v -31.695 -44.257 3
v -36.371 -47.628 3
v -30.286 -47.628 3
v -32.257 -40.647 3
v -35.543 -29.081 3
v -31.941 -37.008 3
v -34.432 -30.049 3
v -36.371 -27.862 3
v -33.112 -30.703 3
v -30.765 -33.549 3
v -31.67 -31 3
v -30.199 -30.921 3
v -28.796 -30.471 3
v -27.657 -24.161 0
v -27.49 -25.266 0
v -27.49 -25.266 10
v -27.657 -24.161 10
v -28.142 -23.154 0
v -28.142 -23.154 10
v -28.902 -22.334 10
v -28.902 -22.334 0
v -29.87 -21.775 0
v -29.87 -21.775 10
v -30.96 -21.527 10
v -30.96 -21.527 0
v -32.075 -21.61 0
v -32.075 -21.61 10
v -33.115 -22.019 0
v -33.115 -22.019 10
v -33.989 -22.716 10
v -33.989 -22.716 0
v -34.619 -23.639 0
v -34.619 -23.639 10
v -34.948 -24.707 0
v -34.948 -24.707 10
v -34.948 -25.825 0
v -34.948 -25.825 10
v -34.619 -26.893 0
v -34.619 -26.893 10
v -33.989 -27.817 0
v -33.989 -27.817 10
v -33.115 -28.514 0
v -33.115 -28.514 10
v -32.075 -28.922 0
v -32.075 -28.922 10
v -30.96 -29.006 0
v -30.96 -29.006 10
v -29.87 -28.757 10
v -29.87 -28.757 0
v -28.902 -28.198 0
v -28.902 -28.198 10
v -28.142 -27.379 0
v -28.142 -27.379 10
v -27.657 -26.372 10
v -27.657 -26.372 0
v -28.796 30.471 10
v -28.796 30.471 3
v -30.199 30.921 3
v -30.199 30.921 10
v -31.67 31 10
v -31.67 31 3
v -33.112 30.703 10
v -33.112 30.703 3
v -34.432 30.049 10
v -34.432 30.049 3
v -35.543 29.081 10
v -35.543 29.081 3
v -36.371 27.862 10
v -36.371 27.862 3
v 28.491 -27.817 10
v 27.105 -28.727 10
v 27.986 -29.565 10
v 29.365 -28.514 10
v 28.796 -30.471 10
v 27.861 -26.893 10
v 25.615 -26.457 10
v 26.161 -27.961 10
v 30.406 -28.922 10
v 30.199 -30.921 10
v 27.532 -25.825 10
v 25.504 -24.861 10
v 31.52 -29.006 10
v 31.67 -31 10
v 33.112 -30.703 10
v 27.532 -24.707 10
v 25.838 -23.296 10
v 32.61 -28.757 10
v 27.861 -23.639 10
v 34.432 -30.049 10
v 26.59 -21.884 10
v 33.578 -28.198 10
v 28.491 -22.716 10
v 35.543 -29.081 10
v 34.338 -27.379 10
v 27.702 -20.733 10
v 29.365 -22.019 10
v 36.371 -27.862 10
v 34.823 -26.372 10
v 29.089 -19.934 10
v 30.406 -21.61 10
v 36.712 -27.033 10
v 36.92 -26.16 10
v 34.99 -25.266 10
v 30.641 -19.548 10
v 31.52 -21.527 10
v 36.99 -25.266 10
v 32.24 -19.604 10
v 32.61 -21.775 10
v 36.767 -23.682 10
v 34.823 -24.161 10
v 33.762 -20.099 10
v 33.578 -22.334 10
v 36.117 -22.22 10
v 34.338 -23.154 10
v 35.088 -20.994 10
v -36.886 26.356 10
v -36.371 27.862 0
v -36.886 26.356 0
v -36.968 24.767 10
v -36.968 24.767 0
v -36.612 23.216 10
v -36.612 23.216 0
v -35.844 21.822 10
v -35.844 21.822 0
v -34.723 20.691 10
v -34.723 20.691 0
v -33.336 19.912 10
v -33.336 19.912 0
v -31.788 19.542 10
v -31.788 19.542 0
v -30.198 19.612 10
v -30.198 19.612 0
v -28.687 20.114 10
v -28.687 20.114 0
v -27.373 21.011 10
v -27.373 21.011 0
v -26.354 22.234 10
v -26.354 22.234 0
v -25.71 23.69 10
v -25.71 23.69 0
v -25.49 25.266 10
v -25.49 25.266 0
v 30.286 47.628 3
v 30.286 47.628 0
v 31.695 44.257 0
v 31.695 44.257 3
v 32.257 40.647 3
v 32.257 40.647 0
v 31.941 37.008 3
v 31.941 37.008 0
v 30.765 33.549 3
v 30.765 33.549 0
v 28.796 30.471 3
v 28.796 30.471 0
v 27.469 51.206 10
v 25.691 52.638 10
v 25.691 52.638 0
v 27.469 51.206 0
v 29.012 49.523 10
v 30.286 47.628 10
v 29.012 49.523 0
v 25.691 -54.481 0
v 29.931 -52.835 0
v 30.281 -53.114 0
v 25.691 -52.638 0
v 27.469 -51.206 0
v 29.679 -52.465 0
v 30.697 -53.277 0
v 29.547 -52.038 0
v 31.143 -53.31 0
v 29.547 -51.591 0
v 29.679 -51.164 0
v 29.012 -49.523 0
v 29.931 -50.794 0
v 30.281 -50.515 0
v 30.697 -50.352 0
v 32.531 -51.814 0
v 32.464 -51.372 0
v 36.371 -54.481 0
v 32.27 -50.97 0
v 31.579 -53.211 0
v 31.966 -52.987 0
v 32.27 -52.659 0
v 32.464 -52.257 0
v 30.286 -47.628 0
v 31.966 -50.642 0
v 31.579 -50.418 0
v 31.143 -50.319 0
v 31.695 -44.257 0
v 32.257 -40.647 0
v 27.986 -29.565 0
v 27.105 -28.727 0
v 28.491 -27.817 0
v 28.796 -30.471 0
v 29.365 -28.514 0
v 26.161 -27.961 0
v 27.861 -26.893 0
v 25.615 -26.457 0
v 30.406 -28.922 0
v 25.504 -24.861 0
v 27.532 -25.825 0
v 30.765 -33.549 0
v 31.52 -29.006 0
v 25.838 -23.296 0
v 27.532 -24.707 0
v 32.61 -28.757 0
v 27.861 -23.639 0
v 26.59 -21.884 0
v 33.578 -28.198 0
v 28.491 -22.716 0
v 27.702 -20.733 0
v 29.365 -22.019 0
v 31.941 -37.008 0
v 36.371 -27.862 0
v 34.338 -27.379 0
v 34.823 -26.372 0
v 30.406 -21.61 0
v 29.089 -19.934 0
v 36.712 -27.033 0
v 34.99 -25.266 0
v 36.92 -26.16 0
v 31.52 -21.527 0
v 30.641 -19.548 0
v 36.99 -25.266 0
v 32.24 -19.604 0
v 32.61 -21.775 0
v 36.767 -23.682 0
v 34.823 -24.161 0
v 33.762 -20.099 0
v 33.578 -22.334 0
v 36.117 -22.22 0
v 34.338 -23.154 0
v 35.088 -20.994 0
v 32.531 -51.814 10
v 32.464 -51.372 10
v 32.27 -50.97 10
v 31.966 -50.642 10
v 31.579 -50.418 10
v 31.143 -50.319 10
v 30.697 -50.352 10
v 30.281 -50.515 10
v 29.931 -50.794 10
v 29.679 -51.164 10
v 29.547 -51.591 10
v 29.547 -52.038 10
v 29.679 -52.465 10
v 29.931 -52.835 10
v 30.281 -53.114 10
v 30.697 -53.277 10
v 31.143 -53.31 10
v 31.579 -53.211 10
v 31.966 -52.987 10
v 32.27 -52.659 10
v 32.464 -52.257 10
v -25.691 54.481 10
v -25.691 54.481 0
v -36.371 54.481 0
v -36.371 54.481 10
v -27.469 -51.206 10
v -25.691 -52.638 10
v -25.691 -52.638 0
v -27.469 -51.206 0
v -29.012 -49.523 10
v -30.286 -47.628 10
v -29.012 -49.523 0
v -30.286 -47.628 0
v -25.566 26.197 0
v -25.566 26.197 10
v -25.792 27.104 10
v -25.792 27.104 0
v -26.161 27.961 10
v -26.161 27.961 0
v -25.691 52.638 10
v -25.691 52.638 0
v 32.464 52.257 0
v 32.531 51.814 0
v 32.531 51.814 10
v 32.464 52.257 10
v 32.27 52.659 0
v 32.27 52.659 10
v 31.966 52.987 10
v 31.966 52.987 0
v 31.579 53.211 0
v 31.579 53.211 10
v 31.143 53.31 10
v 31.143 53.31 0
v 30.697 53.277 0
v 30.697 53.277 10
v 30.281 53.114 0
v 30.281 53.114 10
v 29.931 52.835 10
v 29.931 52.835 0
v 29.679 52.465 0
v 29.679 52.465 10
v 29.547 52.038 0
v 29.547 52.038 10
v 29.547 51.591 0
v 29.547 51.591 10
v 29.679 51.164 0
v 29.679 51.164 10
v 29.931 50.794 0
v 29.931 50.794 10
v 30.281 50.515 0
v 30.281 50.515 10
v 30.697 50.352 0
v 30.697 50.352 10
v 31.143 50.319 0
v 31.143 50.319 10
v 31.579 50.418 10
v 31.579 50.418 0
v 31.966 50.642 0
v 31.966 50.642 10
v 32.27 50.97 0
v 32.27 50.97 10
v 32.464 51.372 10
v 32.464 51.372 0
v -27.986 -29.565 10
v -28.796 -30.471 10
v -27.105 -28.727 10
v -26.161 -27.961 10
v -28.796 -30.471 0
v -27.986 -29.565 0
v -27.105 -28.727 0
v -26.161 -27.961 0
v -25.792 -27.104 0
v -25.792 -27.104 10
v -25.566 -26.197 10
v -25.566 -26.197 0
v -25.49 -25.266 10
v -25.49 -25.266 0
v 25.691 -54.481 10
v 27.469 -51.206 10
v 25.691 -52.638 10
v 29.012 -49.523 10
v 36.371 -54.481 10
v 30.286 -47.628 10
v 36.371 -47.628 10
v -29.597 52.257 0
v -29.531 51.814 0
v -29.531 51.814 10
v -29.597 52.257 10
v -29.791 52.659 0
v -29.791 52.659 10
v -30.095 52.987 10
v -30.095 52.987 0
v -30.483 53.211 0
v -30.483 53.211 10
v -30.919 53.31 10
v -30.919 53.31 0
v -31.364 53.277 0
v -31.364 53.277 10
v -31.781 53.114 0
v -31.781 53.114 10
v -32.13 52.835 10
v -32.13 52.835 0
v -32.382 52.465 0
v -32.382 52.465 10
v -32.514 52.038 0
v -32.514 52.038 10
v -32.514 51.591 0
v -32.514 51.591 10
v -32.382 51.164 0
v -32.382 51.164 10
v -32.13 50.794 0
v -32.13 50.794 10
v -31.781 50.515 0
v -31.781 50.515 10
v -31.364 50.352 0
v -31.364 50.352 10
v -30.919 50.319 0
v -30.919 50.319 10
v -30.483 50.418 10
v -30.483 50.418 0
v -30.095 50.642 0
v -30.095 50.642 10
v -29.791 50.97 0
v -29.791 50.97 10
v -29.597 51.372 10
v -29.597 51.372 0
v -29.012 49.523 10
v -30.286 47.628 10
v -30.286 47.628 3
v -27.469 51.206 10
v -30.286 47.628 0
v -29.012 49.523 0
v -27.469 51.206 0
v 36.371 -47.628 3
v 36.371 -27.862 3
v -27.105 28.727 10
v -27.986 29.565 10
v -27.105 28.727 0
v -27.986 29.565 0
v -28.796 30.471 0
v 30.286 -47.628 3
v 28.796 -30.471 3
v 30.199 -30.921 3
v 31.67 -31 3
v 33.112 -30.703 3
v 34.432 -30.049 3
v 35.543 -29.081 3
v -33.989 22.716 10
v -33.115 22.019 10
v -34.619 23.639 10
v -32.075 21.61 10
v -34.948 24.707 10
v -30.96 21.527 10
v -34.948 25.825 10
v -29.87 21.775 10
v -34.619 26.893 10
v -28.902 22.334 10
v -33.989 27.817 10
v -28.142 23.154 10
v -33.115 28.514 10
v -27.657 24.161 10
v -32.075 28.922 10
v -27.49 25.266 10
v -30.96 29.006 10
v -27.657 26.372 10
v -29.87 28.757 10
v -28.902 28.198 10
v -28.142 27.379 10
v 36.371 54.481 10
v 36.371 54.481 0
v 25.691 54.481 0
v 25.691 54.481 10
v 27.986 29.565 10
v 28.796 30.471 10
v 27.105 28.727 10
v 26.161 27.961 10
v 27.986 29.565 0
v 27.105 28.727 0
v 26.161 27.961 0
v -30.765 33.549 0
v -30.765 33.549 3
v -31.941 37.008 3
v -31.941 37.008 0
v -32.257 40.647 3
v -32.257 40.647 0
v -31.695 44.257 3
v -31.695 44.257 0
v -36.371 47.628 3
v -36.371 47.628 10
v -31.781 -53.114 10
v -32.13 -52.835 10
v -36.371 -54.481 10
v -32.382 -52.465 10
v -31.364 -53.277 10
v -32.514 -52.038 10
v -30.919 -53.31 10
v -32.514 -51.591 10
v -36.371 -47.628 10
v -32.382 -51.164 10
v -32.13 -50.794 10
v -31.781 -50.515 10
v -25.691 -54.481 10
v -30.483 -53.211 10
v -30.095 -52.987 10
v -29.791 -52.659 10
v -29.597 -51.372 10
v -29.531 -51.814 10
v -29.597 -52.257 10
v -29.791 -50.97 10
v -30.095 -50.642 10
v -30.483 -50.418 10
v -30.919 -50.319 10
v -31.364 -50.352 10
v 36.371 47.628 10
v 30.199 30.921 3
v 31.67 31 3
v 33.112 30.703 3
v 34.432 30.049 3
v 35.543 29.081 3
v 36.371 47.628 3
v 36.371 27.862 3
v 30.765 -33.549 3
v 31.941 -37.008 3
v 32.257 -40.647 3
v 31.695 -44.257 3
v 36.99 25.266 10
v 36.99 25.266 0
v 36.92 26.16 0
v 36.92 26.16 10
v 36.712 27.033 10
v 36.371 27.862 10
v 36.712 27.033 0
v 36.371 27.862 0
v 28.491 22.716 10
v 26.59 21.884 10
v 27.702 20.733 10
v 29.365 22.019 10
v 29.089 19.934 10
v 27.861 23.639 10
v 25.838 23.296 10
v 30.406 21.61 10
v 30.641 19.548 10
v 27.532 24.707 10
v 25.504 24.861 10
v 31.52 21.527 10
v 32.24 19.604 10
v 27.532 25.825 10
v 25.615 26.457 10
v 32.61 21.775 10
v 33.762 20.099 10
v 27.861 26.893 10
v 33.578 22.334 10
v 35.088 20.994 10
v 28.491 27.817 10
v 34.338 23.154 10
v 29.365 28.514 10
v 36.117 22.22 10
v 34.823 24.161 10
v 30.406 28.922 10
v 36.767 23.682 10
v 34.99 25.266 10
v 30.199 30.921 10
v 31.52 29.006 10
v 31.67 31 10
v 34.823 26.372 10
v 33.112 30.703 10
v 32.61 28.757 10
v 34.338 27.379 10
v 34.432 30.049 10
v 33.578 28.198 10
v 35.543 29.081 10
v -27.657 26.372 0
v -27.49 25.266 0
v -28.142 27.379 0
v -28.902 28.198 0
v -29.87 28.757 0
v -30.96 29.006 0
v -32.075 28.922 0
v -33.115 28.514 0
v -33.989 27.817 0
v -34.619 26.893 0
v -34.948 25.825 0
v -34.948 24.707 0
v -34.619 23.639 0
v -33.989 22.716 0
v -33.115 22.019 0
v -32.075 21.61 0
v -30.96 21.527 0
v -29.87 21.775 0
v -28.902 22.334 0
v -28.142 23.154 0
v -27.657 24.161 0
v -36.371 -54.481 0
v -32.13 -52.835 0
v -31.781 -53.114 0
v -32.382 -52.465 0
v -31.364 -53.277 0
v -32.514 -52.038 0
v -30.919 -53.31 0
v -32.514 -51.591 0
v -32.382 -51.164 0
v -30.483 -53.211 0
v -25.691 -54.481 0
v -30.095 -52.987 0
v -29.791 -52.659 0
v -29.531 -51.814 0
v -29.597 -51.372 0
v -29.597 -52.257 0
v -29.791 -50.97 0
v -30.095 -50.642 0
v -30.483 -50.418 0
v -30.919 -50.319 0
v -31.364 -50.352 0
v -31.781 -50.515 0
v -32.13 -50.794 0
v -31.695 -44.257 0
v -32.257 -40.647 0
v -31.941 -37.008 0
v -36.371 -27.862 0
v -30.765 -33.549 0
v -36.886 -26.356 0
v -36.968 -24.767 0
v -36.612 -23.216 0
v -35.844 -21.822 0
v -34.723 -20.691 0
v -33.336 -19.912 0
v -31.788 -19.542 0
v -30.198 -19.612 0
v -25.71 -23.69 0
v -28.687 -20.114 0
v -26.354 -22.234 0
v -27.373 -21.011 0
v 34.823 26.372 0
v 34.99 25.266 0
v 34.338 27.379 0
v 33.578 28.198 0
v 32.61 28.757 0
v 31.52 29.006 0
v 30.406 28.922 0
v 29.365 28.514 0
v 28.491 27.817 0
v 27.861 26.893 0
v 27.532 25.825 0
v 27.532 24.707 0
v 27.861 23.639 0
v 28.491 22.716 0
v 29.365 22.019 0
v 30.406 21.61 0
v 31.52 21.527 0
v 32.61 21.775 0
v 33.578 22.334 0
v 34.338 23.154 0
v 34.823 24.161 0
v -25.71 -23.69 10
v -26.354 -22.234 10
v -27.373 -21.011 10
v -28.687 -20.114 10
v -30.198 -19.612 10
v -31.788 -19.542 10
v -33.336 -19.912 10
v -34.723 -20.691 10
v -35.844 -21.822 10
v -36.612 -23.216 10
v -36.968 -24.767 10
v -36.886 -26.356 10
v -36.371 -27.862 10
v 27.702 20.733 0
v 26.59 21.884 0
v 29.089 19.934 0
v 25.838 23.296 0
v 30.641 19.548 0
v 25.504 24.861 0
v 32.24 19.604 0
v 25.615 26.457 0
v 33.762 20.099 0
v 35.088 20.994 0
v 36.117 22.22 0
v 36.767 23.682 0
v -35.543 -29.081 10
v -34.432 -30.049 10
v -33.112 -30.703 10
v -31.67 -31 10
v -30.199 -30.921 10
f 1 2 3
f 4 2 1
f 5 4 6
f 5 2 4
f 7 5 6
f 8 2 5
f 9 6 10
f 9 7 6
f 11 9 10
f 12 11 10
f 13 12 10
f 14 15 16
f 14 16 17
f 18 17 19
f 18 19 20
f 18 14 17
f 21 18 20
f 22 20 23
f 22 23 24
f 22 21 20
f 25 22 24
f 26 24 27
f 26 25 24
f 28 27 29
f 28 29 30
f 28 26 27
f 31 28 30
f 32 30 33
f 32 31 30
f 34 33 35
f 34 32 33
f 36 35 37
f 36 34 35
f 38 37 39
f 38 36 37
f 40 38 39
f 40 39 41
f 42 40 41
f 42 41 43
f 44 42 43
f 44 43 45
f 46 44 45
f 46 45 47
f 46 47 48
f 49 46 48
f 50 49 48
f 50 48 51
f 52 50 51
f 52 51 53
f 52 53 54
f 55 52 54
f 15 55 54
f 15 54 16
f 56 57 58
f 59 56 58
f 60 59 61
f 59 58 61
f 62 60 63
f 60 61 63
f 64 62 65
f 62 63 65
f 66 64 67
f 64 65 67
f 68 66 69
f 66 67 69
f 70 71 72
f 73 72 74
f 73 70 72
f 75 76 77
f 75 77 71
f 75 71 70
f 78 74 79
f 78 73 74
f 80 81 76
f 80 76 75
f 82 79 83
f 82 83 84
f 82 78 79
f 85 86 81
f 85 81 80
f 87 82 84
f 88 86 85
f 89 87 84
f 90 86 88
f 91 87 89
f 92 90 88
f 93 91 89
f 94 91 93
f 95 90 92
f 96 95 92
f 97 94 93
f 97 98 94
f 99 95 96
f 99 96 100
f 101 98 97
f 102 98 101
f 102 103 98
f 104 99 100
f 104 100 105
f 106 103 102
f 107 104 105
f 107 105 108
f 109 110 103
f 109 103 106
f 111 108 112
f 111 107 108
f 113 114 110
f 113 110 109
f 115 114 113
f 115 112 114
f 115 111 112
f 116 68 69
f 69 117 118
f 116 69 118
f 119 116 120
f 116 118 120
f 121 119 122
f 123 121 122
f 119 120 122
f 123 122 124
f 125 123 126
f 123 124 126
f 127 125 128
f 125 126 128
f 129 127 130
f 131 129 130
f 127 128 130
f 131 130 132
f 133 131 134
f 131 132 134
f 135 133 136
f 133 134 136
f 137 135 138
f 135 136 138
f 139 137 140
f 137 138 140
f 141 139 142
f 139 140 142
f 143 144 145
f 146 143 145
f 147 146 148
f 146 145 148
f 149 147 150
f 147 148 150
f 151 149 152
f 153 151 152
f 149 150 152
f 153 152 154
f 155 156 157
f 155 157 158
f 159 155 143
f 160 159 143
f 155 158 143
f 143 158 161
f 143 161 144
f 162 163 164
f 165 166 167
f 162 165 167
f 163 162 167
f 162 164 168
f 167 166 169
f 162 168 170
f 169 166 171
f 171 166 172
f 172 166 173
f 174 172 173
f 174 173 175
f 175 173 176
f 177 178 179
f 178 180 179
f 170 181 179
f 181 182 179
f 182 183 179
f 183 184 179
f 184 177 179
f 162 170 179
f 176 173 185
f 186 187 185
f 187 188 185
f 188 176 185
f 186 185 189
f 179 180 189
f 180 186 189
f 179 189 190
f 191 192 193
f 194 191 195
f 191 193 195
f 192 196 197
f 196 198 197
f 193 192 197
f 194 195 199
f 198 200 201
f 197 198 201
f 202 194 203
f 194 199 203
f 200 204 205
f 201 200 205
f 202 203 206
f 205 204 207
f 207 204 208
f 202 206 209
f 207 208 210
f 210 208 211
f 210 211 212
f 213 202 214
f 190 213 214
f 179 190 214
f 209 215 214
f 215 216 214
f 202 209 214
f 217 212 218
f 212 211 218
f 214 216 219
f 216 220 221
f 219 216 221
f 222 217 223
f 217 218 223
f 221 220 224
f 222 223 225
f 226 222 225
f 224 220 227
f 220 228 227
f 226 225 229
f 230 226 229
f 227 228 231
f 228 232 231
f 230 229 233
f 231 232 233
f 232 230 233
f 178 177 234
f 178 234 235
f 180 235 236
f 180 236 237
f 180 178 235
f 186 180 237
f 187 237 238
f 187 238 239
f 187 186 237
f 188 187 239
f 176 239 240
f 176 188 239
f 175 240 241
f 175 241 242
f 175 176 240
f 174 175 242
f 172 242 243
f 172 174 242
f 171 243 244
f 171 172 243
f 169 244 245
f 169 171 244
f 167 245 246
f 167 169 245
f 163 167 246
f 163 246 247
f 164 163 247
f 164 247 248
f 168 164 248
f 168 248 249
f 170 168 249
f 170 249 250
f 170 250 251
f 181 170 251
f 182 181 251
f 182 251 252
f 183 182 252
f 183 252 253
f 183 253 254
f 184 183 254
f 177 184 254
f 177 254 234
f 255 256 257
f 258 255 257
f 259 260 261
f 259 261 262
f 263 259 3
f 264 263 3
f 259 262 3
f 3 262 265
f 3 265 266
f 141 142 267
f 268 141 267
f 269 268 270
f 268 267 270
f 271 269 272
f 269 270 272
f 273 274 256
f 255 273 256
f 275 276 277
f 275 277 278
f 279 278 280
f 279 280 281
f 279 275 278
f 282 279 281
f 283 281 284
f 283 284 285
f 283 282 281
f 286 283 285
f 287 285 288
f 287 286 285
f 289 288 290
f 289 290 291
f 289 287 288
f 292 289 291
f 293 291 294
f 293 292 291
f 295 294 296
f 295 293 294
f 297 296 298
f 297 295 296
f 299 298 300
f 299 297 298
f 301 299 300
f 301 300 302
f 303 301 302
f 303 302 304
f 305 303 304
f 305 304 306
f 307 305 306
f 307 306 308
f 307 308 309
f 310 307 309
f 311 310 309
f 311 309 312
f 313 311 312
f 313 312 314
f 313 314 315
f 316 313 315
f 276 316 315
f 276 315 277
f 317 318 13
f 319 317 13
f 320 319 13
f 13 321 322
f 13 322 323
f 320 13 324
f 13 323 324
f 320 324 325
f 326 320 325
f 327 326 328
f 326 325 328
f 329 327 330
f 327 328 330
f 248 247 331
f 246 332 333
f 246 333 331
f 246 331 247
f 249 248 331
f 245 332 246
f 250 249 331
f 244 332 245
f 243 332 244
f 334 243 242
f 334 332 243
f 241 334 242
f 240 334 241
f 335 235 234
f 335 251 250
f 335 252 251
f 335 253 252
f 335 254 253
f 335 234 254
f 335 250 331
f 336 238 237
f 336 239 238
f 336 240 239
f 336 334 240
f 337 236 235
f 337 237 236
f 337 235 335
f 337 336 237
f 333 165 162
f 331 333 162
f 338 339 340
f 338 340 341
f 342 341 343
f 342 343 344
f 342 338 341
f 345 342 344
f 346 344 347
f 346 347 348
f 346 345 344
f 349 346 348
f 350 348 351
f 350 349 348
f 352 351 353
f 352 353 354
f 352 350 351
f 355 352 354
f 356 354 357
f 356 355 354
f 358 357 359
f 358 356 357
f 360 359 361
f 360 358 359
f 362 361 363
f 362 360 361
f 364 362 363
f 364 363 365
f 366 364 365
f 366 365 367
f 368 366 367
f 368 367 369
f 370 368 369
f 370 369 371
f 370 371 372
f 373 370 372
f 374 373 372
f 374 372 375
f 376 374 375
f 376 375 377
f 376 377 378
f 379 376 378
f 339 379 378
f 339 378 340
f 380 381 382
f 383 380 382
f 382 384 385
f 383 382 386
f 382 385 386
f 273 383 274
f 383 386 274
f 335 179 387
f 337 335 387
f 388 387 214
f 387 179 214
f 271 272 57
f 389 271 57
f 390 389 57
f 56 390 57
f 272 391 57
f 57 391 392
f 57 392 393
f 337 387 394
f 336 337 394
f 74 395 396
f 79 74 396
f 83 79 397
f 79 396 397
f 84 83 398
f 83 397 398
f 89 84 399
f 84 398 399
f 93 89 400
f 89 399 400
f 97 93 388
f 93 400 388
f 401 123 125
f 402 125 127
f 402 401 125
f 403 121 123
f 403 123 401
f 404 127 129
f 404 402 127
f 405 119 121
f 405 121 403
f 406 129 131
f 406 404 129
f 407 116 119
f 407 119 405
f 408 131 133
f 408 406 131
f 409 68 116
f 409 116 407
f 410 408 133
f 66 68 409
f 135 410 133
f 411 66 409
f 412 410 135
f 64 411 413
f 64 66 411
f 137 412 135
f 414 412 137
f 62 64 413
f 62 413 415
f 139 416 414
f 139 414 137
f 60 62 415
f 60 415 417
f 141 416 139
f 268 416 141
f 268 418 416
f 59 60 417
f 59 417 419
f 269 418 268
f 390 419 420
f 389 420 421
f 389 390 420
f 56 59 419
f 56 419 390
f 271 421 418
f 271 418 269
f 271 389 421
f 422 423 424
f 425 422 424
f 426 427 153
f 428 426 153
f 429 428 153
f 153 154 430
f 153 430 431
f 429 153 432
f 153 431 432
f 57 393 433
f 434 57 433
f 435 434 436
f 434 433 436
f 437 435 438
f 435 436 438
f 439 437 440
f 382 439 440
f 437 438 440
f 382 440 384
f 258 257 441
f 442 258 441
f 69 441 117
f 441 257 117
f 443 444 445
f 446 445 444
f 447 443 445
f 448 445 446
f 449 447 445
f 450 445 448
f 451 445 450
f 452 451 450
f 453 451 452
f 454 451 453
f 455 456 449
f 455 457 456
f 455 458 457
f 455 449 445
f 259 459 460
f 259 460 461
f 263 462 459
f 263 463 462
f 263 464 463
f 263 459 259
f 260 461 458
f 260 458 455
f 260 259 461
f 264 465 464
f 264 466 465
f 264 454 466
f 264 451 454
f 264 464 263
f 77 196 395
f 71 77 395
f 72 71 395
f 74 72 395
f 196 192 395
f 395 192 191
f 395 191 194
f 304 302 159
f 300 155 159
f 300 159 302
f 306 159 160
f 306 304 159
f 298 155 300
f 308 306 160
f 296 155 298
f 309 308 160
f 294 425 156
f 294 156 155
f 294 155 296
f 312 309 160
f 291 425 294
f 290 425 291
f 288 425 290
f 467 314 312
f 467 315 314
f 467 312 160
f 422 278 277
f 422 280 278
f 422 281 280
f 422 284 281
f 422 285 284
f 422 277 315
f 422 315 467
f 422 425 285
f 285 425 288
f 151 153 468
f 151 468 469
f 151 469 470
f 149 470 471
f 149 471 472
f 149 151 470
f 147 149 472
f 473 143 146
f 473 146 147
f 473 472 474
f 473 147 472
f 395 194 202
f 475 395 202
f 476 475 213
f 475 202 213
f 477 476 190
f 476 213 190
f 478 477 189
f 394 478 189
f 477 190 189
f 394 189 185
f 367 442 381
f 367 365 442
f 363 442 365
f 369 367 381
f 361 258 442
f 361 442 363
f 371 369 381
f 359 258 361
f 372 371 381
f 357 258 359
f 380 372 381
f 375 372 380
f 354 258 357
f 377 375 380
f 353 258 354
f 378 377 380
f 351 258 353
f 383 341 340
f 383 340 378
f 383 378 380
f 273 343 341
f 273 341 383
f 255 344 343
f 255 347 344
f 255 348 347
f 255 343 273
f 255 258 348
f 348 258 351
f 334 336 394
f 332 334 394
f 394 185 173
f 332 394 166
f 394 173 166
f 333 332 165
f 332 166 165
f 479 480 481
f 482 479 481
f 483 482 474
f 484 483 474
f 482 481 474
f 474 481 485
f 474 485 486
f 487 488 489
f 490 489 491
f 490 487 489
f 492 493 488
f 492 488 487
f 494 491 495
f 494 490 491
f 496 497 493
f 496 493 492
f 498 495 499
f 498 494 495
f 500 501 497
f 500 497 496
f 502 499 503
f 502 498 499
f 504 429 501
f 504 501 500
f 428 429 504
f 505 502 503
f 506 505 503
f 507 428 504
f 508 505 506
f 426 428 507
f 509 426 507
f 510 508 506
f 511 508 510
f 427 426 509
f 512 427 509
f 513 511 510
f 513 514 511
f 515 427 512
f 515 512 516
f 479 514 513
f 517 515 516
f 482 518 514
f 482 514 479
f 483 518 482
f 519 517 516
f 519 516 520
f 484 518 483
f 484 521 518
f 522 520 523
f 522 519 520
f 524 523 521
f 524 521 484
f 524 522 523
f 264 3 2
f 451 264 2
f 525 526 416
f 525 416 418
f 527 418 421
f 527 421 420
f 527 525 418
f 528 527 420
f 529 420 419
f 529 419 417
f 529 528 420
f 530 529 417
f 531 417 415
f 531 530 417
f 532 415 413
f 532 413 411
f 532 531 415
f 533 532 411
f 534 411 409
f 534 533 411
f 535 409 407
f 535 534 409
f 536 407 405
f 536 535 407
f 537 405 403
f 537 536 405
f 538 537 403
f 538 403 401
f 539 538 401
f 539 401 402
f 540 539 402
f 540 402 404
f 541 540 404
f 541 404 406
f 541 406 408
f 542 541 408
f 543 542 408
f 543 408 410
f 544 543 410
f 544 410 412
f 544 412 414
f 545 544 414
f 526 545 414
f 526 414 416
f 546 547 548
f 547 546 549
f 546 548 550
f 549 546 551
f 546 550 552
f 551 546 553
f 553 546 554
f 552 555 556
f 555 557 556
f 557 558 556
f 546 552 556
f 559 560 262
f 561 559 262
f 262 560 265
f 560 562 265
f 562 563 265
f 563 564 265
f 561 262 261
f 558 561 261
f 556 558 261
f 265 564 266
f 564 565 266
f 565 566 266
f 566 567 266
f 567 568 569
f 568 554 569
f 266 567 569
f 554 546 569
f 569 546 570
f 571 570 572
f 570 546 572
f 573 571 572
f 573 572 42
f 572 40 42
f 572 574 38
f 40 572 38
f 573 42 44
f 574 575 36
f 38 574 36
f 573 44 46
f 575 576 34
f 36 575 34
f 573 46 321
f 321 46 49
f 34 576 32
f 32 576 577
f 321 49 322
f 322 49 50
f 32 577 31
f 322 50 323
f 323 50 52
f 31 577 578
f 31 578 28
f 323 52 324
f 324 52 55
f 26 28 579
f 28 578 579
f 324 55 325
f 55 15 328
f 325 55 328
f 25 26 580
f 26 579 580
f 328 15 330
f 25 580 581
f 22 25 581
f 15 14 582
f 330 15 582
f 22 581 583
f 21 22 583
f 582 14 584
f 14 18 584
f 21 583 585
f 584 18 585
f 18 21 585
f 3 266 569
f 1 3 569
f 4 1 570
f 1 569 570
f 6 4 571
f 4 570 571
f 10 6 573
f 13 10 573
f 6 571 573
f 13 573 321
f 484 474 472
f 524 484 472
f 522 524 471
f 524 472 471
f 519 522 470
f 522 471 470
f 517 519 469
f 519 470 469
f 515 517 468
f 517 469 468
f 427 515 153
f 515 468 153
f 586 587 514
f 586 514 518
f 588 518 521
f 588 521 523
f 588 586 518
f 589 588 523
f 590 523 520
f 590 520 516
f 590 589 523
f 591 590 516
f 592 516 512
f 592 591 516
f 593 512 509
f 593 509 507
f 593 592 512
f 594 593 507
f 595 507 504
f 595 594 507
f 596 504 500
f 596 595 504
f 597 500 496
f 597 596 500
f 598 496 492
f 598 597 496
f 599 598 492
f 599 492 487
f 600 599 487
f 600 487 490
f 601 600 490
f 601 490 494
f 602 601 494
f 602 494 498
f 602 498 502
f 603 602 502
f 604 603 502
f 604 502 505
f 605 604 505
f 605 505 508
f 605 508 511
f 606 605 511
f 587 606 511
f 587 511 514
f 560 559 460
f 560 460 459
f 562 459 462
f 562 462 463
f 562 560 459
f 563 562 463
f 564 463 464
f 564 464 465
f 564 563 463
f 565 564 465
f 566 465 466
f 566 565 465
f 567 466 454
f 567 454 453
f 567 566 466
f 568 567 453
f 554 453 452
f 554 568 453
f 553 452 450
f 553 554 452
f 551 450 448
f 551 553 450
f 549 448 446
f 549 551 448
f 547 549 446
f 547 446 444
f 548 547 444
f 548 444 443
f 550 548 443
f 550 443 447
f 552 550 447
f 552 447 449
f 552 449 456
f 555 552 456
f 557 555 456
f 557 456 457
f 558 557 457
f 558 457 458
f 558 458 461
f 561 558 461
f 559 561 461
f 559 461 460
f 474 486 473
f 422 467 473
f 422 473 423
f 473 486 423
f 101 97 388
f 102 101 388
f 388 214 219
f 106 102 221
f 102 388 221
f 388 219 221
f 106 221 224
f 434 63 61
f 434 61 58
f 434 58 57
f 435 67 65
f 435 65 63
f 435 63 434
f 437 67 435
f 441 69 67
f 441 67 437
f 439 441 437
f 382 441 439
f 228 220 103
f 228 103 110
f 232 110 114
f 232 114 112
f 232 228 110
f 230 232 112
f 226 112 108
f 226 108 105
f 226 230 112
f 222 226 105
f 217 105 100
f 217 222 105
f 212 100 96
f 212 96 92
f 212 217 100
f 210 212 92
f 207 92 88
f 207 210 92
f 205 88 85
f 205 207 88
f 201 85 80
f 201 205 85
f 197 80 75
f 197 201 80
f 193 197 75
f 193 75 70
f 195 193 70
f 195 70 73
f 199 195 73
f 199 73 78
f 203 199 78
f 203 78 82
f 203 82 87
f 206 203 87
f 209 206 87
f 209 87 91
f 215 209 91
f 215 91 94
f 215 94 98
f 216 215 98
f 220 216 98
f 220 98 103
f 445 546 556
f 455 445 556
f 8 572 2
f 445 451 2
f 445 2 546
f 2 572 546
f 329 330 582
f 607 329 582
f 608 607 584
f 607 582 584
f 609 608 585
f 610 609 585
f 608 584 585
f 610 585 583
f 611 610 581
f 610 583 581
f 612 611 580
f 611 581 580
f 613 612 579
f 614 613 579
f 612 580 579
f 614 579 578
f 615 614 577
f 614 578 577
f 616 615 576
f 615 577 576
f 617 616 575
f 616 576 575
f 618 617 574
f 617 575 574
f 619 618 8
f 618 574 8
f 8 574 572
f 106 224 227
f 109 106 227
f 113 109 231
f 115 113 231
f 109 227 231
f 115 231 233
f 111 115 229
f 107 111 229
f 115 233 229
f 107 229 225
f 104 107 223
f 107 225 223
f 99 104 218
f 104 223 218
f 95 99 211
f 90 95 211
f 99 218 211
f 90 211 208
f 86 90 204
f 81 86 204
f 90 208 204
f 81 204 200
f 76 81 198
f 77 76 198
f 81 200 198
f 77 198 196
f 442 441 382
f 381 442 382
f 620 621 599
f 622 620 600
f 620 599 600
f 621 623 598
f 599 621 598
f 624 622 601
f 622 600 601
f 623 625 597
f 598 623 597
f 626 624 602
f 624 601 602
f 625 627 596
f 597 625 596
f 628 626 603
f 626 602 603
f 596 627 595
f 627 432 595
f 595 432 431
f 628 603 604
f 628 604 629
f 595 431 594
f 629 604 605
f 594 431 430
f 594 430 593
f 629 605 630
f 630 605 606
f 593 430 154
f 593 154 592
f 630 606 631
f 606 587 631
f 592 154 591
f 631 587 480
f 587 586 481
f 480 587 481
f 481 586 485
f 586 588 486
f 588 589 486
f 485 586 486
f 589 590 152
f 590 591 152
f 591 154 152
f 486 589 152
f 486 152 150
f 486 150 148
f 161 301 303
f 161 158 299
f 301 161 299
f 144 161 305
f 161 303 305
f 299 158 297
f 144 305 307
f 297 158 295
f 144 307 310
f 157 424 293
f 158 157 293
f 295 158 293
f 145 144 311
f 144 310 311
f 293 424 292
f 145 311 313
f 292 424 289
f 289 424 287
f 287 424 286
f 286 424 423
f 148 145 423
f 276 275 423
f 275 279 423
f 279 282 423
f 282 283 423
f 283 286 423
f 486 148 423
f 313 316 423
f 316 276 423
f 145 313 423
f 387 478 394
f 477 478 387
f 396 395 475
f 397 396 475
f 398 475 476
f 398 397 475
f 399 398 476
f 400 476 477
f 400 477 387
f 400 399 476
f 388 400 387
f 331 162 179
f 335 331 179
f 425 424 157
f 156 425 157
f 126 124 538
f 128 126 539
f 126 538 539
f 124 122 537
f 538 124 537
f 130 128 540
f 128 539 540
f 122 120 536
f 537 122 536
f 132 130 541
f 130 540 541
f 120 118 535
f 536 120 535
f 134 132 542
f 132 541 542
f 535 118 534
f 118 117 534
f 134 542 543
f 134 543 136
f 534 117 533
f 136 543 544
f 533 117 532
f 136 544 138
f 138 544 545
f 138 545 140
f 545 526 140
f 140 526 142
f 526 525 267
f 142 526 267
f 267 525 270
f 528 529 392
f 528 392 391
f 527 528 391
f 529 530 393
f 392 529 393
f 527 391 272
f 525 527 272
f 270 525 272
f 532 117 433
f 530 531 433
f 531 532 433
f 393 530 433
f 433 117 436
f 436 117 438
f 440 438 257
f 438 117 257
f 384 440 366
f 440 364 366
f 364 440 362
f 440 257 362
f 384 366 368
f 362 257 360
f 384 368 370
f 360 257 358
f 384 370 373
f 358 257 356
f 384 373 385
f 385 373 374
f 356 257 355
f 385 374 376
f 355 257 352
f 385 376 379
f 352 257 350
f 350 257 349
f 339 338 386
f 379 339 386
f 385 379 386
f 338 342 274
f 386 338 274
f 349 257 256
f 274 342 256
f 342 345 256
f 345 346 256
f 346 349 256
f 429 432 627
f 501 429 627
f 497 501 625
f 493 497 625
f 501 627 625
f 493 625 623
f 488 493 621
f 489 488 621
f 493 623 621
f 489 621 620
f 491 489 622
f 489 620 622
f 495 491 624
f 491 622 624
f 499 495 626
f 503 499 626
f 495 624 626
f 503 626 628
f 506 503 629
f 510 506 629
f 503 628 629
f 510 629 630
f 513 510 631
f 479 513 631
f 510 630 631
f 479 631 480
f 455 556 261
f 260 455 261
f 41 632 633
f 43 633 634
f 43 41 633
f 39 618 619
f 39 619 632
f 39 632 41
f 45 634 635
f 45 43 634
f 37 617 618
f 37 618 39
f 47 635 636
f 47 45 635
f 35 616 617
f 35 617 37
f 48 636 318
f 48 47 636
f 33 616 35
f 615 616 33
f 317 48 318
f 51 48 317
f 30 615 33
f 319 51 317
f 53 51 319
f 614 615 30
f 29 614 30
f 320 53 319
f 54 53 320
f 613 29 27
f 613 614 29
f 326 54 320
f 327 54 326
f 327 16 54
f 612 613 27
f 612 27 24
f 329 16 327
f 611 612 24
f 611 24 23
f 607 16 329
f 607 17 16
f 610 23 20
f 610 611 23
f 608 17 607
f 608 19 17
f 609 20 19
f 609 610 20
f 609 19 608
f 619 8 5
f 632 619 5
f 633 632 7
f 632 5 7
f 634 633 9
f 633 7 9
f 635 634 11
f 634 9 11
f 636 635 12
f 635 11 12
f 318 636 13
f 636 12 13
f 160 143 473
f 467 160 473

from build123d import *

# Parameters (mm, degrees)
F0_R     = 3.75
F0_R_2   = 1.5
F1_DEPTH = 3
F2_DEPTH = 10


with BuildPart() as f1:
    # F0 (on Top) → F1 (new body)
    with BuildSketch(Plane.XY):
        with BuildLine():
            ThreePointArc((-36.370623, 27.862394), (-32.574581, 19.67326), (-25.490072, 25.266254))
            ThreePointArc((-25.490072, 25.266254), (-25.660285, 26.65495), (-26.160846, 27.961428))
            ThreePointArc((-26.160846, 27.961428), (-27.553867, 29.136956), (-28.795974, 30.470953))
            ThreePointArc((-28.795974, 30.470953), (-33.112344, 30.702898), (-36.370623, 27.862394))
        make_face()
        with Locations((-31.240072, 25.266254)):
            Circle(F0_R, mode=Mode.SUBTRACT)
        with BuildLine():
            ThreePointArc((26.160846, 27.961428), (29.851376, 19.686467), (36.990072, 25.266254))
            ThreePointArc((36.990072, 25.266254), (36.833066, 26.600763), (36.370623, 27.862394))
            ThreePointArc((36.370623, 27.862394), (33.112344, 30.702898), (28.795974, 30.470953))
            ThreePointArc((28.795974, 30.470953), (27.553867, 29.136956), (26.160846, 27.961428))
        make_face()
        with Locations((31.240072, 25.266254)):
            Circle(F0_R, mode=Mode.SUBTRACT)
        with BuildLine():
            Line((30.285853, 47.628131), (36.370623, 47.628131))
            Line((36.370623, 47.628131), (36.370623, 54.481386))
            Line((36.370623, 54.481386), (25.690743, 54.481386))
            Line((25.690743, 54.481386), (25.690743, 52.638071))
            ThreePointArc((25.690743, 52.638071), (28.272313, 50.393599), (30.285853, 47.628131))
        make_face()
        with Locations((31.030683, 51.814485)):
            Circle(F0_R_2, mode=Mode.SUBTRACT)
        with BuildLine():
            ThreePointArc((36.370623, -27.862394), (36.833066, -26.600763), (36.990072, -25.266254))
            ThreePointArc((36.990072, -25.266254), (29.851376, -19.686467), (26.160846, -27.961428))
            ThreePointArc((26.160846, -27.961428), (27.553867, -29.136956), (28.795974, -30.470953))
            ThreePointArc((28.795974, -30.470953), (33.112344, -30.702898), (36.370623, -27.862394))
        make_face()
        with Locations((31.240072, -25.266254)):
            Circle(F0_R, mode=Mode.SUBTRACT)
        with BuildLine():
            Line((36.370623, -47.628131), (36.370623, -27.862394))
            ThreePointArc((36.370623, -27.862394), (33.112344, -30.702898), (28.795974, -30.470953))
            ThreePointArc((28.795974, -30.470953), (32.208965, -38.817856), (30.285853, -47.628131))
            Line((30.285853, -47.628131), (36.370623, -47.628131))
        make_face()
        with BuildLine():
            ThreePointArc((-26.160846, -27.961428), (-25.660285, -26.65495), (-25.490072, -25.266254))
            ThreePointArc((-25.490072, -25.266254), (-32.574581, -19.67326), (-36.370623, -27.862394))
            ThreePointArc((-36.370623, -27.862394), (-33.112344, -30.702898), (-28.795974, -30.470953))
            ThreePointArc((-28.795974, -30.470953), (-27.553867, -29.136956), (-26.160846, -27.961428))
        make_face()
        with Locations((-31.240072, -25.266254)):
            Circle(F0_R, mode=Mode.SUBTRACT)
        with BuildLine():
            Line((-36.370623, 47.628131), (-36.370623, 27.862394))
            ThreePointArc((-36.370623, 27.862394), (-33.112344, 30.702898), (-28.795974, 30.470953))
            ThreePointArc((-28.795974, 30.470953), (-32.208965, 38.817856), (-30.285853, 47.628131))
            Line((-30.285853, 47.628131), (-36.370623, 47.628131))
        make_face()
        with BuildLine():
            ThreePointArc((-28.795974, -30.470953), (-33.112344, -30.702898), (-36.370623, -27.862394))
            Line((-36.370623, -27.862394), (-36.370623, -47.628131))
            Line((-36.370623, -47.628131), (-30.285853, -47.628131))
            ThreePointArc((-30.285853, -47.628131), (-32.208965, -38.817856), (-28.795974, -30.470953))
        make_face()
        with BuildLine():
            ThreePointArc((28.795974, 30.470953), (33.112344, 30.702898), (36.370623, 27.862394))
            Line((36.370623, 27.862394), (36.370623, 47.628131))
            Line((36.370623, 47.628131), (30.285853, 47.628131))
            ThreePointArc((30.285853, 47.628131), (32.208965, 38.817856), (28.795974, 30.470953))
        make_face()
        with BuildLine():
            Line((-36.370623, 54.481386), (-36.370623, 47.628131))
            Line((-36.370623, 47.628131), (-30.285853, 47.628131))
            ThreePointArc((-30.285853, 47.628131), (-28.272313, 50.393599), (-25.690743, 52.638071))
            Line((-25.690743, 52.638071), (-25.690743, 54.481386))
            Line((-25.690743, 54.481386), (-36.370623, 54.481386))
        make_face()
        with Locations((-31.030683, 51.814485)):
            Circle(F0_R_2, mode=Mode.SUBTRACT)
        with BuildLine():
            Line((36.370623, -54.481386), (36.370623, -47.628131))
            Line((36.370623, -47.628131), (30.285853, -47.628131))
            ThreePointArc((30.285853, -47.628131), (28.272313, -50.393599), (25.690743, -52.638071))
            Line((25.690743, -52.638071), (25.690743, -54.481386))
            Line((25.690743, -54.481386), (36.370623, -54.481386))
        make_face()
        with Locations((31.030683, -51.814485)):
            Circle(F0_R_2, mode=Mode.SUBTRACT)
        with BuildLine():
            Line((-30.285853, -47.628131), (-36.370623, -47.628131))
            Line((-36.370623, -47.628131), (-36.370623, -54.481386))
            Line((-36.370623, -54.481386), (-25.690743, -54.481386))
            Line((-25.690743, -54.481386), (-25.690743, -52.638071))
            ThreePointArc((-25.690743, -52.638071), (-28.272313, -50.393599), (-30.285853, -47.628131))
        make_face()
        with Locations((-31.030683, -51.814485)):
            Circle(F0_R_2, mode=Mode.SUBTRACT)
    extrude(amount=F1_DEPTH)

    # F0 (on Top) → F2 (join)
    with BuildSketch(Plane.XY):
        with BuildLine():
            ThreePointArc((-36.370623, 27.862394), (-32.574581, 19.67326), (-25.490072, 25.266254))
            ThreePointArc((-25.490072, 25.266254), (-25.660285, 26.65495), (-26.160846, 27.961428))
            ThreePointArc((-26.160846, 27.961428), (-27.553867, 29.136956), (-28.795974, 30.470953))
            ThreePointArc((-28.795974, 30.470953), (-33.112344, 30.702898), (-36.370623, 27.862394))
        make_face()
        with Locations((-31.240072, 25.266254)):
            Circle(F0_R, mode=Mode.SUBTRACT)
        with BuildLine():
            ThreePointArc((26.160846, 27.961428), (29.851376, 19.686467), (36.990072, 25.266254))
            ThreePointArc((36.990072, 25.266254), (36.833066, 26.600763), (36.370623, 27.862394))
            ThreePointArc((36.370623, 27.862394), (33.112344, 30.702898), (28.795974, 30.470953))
            ThreePointArc((28.795974, 30.470953), (27.553867, 29.136956), (26.160846, 27.961428))
        make_face()
        with Locations((31.240072, 25.266254)):
            Circle(F0_R, mode=Mode.SUBTRACT)
        with BuildLine():
            ThreePointArc((36.370623, -27.862394), (36.833066, -26.600763), (36.990072, -25.266254))
            ThreePointArc((36.990072, -25.266254), (29.851376, -19.686467), (26.160846, -27.961428))
            ThreePointArc((26.160846, -27.961428), (27.553867, -29.136956), (28.795974, -30.470953))
            ThreePointArc((28.795974, -30.470953), (33.112344, -30.702898), (36.370623, -27.862394))
        make_face()
        with Locations((31.240072, -25.266254)):
            Circle(F0_R, mode=Mode.SUBTRACT)
        with BuildLine():
            ThreePointArc((-26.160846, -27.961428), (-25.660285, -26.65495), (-25.490072, -25.266254))
            ThreePointArc((-25.490072, -25.266254), (-32.574581, -19.67326), (-36.370623, -27.862394))
            ThreePointArc((-36.370623, -27.862394), (-33.112344, -30.702898), (-28.795974, -30.470953))
            ThreePointArc((-28.795974, -30.470953), (-27.553867, -29.136956), (-26.160846, -27.961428))
        make_face()
        with Locations((-31.240072, -25.266254)):
            Circle(F0_R, mode=Mode.SUBTRACT)
        with BuildLine():
            Line((-36.370623, 54.481386), (-36.370623, 47.628131))
            Line((-36.370623, 47.628131), (-30.285853, 47.628131))
            ThreePointArc((-30.285853, 47.628131), (-28.272313, 50.393599), (-25.690743, 52.638071))
            Line((-25.690743, 52.638071), (-25.690743, 54.481386))
            Line((-25.690743, 54.481386), (-36.370623, 54.481386))
        make_face()
        with Locations((-31.030683, 51.814485)):
            Circle(F0_R_2, mode=Mode.SUBTRACT)
        with BuildLine():
            Line((30.285853, 47.628131), (36.370623, 47.628131))
            Line((36.370623, 47.628131), (36.370623, 54.481386))
            Line((36.370623, 54.481386), (25.690743, 54.481386))
            Line((25.690743, 54.481386), (25.690743, 52.638071))
            ThreePointArc((25.690743, 52.638071), (28.272313, 50.393599), (30.285853, 47.628131))
        make_face()
        with Locations((31.030683, 51.814485)):
            Circle(F0_R_2, mode=Mode.SUBTRACT)
        with BuildLine():
            Line((36.370623, -54.481386), (36.370623, -47.628131))
            Line((36.370623, -47.628131), (30.285853, -47.628131))
            ThreePointArc((30.285853, -47.628131), (28.272313, -50.393599), (25.690743, -52.638071))
            Line((25.690743, -52.638071), (25.690743, -54.481386))
            Line((25.690743, -54.481386), (36.370623, -54.481386))
        make_face()
        with Locations((31.030683, -51.814485)):
            Circle(F0_R_2, mode=Mode.SUBTRACT)
        with BuildLine():
            Line((-30.285853, -47.628131), (-36.370623, -47.628131))
            Line((-36.370623, -47.628131), (-36.370623, -54.481386))
            Line((-36.370623, -54.481386), (-25.690743, -54.481386))
            Line((-25.690743, -54.481386), (-25.690743, -52.638071))
            ThreePointArc((-25.690743, -52.638071), (-28.272313, -50.393599), (-30.285853, -47.628131))
        make_face()
        with Locations((-31.030683, -51.814485)):
            Circle(F0_R_2, mode=Mode.SUBTRACT)
    extrude(amount=F2_DEPTH)


solid = f1.part
